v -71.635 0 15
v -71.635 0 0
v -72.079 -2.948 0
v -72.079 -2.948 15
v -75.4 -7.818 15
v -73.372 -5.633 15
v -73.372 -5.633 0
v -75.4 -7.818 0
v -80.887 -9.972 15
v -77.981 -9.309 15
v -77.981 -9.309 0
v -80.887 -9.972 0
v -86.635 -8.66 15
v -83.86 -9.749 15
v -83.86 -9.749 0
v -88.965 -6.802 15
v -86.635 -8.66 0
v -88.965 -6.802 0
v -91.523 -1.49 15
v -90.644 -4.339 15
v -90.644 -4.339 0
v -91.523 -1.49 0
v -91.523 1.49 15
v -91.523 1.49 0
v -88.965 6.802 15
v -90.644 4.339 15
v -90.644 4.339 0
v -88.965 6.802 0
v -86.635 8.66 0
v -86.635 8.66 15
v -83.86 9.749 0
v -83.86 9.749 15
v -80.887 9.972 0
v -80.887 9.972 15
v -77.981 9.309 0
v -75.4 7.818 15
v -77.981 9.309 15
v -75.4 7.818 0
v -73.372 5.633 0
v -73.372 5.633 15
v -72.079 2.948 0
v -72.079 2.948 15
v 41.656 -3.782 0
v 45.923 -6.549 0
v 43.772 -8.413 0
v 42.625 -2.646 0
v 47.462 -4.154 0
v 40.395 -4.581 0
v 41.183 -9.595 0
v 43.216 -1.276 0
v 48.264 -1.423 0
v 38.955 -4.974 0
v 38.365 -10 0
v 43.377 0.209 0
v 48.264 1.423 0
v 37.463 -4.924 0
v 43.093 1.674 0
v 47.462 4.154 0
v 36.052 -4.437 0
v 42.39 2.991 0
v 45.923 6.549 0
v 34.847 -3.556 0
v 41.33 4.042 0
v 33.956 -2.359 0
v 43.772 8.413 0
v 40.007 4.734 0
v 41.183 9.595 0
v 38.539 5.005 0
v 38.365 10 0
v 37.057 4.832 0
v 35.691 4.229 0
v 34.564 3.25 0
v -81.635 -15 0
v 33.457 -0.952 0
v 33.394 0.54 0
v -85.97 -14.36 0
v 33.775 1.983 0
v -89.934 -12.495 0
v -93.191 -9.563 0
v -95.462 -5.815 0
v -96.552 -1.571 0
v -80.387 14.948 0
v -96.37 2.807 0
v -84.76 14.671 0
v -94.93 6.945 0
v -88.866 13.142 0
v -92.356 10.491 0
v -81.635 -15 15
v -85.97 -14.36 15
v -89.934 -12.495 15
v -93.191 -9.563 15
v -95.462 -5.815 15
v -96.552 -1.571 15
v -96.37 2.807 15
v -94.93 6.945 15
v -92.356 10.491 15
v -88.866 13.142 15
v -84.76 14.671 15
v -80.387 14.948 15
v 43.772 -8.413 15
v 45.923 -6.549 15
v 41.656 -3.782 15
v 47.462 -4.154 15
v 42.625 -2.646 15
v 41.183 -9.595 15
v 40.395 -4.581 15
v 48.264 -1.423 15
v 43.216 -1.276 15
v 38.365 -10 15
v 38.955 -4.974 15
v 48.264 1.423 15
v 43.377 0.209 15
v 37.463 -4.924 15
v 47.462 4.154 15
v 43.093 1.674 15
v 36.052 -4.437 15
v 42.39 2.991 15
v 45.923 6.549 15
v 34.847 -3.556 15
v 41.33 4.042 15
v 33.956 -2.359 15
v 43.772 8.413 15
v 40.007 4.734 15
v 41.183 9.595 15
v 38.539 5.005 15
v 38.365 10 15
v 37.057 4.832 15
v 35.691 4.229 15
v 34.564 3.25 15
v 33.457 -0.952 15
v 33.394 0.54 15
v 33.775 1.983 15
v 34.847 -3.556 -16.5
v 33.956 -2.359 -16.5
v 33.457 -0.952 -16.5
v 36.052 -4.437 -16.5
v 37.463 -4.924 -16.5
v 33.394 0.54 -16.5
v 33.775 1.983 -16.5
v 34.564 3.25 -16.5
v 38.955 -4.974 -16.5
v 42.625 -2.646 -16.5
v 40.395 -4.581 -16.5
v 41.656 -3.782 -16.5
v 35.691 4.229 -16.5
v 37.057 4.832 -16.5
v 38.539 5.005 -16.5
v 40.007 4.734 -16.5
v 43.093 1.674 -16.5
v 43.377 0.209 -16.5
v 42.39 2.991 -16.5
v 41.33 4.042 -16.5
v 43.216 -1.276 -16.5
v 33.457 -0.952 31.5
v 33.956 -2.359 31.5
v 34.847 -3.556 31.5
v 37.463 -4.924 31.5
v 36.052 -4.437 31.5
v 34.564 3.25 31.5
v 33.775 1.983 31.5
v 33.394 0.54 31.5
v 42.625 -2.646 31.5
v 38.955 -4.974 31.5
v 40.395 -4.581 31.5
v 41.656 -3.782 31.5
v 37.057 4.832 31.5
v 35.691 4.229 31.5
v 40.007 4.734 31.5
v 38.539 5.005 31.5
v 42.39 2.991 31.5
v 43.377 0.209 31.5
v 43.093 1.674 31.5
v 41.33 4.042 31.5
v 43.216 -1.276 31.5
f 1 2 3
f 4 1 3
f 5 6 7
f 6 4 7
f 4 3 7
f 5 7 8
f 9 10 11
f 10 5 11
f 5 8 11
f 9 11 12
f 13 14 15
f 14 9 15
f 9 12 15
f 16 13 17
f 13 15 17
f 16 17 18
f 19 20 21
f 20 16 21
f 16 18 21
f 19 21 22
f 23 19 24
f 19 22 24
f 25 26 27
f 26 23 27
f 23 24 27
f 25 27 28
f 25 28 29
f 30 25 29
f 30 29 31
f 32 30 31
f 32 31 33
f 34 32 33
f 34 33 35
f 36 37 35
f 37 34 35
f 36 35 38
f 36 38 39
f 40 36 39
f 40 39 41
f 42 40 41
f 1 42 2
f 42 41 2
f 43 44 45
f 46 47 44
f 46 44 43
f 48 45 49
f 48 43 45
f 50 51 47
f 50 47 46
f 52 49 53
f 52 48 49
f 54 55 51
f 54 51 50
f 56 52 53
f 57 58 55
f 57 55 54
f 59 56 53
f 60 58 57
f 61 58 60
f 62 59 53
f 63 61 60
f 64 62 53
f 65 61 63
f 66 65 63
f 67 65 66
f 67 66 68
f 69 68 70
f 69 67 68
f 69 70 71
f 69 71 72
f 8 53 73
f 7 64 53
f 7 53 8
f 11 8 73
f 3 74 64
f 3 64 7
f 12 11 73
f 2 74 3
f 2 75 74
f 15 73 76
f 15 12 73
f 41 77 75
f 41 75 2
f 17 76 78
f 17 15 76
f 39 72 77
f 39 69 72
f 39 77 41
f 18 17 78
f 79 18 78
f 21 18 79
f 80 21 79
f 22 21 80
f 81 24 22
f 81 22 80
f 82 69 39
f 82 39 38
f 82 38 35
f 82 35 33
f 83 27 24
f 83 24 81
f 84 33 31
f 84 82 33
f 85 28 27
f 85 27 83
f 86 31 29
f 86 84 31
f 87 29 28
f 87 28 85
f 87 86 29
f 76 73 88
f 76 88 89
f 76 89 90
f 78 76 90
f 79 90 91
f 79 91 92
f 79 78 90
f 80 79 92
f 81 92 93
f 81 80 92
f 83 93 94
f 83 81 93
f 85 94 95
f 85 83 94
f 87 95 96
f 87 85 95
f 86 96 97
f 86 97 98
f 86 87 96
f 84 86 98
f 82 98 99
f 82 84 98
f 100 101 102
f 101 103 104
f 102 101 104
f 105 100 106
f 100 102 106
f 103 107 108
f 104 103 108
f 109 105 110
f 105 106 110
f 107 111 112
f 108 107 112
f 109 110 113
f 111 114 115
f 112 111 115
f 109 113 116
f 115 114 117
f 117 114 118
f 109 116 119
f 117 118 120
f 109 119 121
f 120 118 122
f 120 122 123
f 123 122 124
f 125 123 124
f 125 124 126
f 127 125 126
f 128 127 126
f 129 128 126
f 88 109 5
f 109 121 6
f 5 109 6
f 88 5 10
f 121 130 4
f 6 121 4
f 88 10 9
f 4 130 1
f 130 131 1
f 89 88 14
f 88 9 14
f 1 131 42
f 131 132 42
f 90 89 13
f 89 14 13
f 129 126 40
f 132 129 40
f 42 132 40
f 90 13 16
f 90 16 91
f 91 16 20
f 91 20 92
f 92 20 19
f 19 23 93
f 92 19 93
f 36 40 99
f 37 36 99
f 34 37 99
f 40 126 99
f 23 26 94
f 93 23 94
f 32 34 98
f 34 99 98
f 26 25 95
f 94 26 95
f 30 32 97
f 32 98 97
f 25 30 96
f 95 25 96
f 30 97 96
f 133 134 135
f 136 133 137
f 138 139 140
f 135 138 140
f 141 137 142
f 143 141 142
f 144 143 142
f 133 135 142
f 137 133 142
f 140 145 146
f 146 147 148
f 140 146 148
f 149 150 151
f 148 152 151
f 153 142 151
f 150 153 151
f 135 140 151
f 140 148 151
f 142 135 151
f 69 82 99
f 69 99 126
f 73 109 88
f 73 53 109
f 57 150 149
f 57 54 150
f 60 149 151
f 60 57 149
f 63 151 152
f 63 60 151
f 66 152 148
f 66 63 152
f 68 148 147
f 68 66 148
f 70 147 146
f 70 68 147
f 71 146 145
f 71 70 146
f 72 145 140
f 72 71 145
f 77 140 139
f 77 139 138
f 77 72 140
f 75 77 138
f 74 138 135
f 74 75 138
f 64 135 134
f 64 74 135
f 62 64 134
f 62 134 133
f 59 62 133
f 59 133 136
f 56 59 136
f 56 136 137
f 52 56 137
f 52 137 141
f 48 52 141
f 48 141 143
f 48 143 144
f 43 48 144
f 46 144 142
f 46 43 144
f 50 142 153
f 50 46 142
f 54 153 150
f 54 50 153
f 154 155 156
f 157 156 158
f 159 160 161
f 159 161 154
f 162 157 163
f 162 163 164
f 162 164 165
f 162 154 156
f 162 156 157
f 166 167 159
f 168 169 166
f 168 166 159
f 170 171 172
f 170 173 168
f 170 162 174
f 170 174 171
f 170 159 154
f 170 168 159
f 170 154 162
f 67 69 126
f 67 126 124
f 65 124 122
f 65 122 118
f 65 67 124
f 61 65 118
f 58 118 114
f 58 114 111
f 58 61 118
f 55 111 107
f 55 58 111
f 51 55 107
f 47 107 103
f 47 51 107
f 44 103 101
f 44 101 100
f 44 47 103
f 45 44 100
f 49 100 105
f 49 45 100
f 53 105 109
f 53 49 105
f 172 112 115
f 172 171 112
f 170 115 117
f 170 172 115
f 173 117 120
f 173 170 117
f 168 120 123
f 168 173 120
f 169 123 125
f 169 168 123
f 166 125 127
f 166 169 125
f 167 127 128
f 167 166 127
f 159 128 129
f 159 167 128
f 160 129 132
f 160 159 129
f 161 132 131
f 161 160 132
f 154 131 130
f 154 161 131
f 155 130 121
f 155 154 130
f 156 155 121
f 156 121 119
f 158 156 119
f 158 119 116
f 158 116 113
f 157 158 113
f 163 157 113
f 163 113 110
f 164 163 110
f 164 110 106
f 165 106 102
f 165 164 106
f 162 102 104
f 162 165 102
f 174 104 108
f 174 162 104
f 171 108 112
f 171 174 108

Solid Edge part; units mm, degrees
sketch "Sketch1" plane through (0, 0, 0) normal (0, 0, 1) x (1, 0, 0)
  arc A0 (-81.6347, -15) -> (-80.3868, 14.948) centre (-81.6347, 0) cw
  line L0 (-80.3868, 14.948) -> (38.3653, 10)
  arc A1 (38.3653, 10) -> (38.3653, -10) centre (38.3653, 0) cw
  line L1 (38.3653, -10) -> (-81.6347, -15)
  circle A2 centre (38.3653, 0) radius 5
  circle A3 centre (-81.6347, 0) radius 10
extrude "Protrusion1" add sketch "Sketch1" along normal blind 15
sketch "Sketch2" plane through (-24.1347, 0, 31.5) normal (0, 0, 1) x (0.9991331, 0.0416305, 0)
  circle A0 centre (62.4537, -2.6022) radius 5.0079
extrude "ExtrudedProtrusion_3" add sketch "Sketch2" against normal blind 48
